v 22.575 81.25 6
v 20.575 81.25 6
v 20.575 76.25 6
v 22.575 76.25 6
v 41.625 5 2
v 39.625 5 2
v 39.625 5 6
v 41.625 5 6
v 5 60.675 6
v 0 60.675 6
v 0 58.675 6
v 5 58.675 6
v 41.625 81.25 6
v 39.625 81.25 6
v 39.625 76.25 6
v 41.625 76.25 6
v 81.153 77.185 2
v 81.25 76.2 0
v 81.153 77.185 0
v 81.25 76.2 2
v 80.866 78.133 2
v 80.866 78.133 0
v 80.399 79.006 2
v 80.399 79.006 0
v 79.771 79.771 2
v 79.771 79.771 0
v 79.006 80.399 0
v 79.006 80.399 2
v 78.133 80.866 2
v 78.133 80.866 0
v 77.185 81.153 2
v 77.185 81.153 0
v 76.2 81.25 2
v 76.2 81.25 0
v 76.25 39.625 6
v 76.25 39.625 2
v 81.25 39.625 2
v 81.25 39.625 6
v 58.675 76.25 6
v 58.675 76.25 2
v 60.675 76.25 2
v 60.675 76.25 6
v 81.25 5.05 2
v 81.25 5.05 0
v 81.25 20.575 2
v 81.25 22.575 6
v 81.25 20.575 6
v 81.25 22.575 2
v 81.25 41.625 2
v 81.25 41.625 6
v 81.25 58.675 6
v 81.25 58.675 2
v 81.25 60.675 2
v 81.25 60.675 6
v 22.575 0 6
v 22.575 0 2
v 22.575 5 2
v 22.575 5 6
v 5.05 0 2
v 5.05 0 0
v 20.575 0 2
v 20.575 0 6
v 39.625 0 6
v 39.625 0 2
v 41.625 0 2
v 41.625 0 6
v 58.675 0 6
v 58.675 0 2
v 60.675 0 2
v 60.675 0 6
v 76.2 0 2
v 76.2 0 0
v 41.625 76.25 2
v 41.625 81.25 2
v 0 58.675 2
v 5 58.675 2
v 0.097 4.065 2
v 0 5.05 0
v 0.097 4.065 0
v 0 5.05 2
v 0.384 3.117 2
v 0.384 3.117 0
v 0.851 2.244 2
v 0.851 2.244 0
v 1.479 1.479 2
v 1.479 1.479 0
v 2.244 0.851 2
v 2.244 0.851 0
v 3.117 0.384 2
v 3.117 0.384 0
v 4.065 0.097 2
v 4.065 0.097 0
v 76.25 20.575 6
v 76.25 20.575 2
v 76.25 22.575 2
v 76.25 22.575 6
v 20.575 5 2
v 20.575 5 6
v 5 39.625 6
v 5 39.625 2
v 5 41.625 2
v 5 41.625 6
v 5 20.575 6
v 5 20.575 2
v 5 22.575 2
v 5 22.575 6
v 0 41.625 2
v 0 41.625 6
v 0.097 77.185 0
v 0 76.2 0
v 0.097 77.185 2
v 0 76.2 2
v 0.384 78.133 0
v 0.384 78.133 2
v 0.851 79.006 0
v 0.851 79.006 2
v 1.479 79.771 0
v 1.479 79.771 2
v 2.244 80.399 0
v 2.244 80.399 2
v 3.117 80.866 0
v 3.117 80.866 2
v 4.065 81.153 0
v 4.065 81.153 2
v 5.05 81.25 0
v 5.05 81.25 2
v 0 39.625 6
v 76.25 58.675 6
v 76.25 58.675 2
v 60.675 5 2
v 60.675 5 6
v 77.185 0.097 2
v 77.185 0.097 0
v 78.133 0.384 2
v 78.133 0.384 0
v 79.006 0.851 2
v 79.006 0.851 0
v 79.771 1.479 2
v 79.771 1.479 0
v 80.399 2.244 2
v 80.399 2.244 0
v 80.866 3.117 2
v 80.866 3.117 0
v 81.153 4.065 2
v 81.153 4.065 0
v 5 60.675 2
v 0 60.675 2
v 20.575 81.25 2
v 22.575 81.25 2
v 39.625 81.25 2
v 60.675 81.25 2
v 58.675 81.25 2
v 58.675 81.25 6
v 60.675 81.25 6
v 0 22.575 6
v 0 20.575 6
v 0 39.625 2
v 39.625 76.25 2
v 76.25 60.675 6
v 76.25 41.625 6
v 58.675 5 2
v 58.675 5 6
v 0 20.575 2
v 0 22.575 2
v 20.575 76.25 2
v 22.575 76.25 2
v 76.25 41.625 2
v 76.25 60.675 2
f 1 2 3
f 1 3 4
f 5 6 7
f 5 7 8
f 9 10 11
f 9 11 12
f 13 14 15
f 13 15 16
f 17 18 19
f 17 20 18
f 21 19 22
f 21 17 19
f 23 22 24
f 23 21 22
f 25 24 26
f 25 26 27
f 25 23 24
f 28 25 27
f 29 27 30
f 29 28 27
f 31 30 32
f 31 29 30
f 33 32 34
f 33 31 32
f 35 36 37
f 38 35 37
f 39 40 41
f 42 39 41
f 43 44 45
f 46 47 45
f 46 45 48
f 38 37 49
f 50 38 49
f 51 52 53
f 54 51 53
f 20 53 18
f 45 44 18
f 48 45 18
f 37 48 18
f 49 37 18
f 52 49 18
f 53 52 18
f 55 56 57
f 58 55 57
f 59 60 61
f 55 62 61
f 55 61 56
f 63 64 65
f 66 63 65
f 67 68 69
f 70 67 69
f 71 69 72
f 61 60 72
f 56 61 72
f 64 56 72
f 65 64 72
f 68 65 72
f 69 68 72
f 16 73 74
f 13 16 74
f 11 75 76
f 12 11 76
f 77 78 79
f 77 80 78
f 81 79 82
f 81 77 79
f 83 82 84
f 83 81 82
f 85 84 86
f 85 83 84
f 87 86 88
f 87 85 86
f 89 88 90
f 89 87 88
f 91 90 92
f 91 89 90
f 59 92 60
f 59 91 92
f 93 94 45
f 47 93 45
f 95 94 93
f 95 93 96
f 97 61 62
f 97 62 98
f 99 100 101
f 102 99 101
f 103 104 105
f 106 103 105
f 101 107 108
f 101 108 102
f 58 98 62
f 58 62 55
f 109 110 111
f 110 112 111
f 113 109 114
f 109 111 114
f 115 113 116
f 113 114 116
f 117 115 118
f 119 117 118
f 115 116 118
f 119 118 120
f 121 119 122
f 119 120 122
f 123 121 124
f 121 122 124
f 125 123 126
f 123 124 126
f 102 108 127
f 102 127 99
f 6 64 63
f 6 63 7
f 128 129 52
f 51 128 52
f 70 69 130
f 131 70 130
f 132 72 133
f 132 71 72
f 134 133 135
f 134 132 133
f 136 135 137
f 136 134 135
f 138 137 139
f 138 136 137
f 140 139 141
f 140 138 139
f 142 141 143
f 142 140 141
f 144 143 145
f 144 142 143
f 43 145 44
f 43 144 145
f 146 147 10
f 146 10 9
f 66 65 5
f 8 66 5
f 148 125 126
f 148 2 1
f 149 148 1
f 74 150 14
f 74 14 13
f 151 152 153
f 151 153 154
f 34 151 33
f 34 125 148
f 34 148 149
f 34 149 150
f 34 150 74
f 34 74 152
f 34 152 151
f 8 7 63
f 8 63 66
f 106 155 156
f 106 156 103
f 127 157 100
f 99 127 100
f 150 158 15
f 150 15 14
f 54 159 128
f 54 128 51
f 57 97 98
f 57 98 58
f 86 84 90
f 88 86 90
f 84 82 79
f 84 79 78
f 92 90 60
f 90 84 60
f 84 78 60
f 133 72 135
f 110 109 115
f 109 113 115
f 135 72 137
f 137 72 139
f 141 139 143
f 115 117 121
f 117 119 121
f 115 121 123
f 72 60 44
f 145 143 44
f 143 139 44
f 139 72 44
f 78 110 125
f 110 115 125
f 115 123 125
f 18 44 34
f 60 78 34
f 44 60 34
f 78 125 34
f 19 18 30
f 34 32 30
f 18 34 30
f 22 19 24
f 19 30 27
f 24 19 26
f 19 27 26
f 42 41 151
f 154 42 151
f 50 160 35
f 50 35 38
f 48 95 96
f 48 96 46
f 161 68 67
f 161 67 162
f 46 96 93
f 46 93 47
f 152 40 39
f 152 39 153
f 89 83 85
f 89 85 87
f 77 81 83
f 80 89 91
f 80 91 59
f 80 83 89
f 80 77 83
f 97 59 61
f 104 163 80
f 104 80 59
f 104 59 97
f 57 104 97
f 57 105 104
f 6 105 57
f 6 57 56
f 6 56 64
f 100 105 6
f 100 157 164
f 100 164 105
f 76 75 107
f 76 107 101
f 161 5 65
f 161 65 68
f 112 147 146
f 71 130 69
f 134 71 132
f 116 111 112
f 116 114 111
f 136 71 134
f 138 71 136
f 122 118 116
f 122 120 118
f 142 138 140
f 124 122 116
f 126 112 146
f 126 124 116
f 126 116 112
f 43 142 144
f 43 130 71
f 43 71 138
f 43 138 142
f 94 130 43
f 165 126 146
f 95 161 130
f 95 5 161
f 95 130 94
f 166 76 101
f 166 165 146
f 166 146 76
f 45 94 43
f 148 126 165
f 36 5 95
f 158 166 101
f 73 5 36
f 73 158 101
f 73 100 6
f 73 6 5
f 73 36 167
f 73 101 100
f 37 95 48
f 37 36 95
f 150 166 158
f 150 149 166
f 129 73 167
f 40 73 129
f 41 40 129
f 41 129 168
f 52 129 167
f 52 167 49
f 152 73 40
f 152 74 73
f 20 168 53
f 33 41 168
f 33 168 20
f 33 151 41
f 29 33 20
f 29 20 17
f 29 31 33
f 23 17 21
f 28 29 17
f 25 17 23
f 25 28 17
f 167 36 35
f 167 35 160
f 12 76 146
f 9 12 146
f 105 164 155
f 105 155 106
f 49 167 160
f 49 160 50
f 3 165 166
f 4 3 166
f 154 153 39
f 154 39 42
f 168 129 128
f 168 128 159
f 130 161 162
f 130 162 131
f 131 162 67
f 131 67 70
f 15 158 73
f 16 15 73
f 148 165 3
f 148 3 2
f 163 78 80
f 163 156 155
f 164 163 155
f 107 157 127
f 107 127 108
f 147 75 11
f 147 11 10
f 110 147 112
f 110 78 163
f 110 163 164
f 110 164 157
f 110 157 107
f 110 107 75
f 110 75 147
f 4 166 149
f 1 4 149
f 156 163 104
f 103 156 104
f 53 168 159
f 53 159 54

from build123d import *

# Parameters (mm, degrees)
SKETCH_W      = 81.25
SKETCH_H      = 81.25
PAD_DEPTH     = 2
FILLET_R      = 5.05
SKETCH001_W   = 2
SKETCH001_H   = 5
SKETCH001_W_2 = 5
SKETCH001_H_2 = 2
PAD001_DEPTH  = 4


with BuildPart() as part:
    # Sketch → Pad (new body)
    with BuildSketch(Plane.XY):
        with Locations((40.625, 40.625)):
            Rectangle(SKETCH_W, SKETCH_H)
    extrude(amount=PAD_DEPTH)

    # Fillet
    fillet_edges = [part.edges().sort_by_distance(p)[0] for p in [
        (81.25, 0, 1),
        (0, 0, 1),
        (0, 81.25, 1),
        (81.25, 81.25, 1),
    ]]
    fillet(fillet_edges, radius=FILLET_R)

    # Sketch001 (on Face5 of Fillet) → Pad001 (join)
    with BuildSketch(Plane.XY.offset(2)):
        with Locations((21.575, 78.75)):
            Rectangle(SKETCH001_W, SKETCH001_H)
        with Locations((40.625, 78.75)):
            Rectangle(SKETCH001_W, SKETCH001_H)
        with Locations((59.675, 78.75)):
            Rectangle(SKETCH001_W, SKETCH001_H)
        with Locations((40.625, 2.5)):
            Rectangle(SKETCH001_W, SKETCH001_H)
        with Locations((59.675, 2.5)):
            Rectangle(SKETCH001_W, SKETCH001_H)
        with Locations((21.575, 2.5)):
            Rectangle(SKETCH001_W, SKETCH001_H)
        with Locations((78.75, 40.625)):
            Rectangle(SKETCH001_W_2, SKETCH001_H_2)
        with Locations((2.5, 40.625)):
            Rectangle(SKETCH001_W_2, SKETCH001_H_2)
        with Locations((78.75, 59.675)):
            Rectangle(SKETCH001_W_2, SKETCH001_H_2)
        with Locations((78.75, 21.575)):
            Rectangle(SKETCH001_W_2, SKETCH001_H_2)
        with Locations((2.5, 59.675)):
            Rectangle(SKETCH001_W_2, SKETCH001_H_2)
        with Locations((2.5, 21.575)):
            Rectangle(SKETCH001_W_2, SKETCH001_H_2)
    extrude(amount=PAD001_DEPTH)


solid = part.part
